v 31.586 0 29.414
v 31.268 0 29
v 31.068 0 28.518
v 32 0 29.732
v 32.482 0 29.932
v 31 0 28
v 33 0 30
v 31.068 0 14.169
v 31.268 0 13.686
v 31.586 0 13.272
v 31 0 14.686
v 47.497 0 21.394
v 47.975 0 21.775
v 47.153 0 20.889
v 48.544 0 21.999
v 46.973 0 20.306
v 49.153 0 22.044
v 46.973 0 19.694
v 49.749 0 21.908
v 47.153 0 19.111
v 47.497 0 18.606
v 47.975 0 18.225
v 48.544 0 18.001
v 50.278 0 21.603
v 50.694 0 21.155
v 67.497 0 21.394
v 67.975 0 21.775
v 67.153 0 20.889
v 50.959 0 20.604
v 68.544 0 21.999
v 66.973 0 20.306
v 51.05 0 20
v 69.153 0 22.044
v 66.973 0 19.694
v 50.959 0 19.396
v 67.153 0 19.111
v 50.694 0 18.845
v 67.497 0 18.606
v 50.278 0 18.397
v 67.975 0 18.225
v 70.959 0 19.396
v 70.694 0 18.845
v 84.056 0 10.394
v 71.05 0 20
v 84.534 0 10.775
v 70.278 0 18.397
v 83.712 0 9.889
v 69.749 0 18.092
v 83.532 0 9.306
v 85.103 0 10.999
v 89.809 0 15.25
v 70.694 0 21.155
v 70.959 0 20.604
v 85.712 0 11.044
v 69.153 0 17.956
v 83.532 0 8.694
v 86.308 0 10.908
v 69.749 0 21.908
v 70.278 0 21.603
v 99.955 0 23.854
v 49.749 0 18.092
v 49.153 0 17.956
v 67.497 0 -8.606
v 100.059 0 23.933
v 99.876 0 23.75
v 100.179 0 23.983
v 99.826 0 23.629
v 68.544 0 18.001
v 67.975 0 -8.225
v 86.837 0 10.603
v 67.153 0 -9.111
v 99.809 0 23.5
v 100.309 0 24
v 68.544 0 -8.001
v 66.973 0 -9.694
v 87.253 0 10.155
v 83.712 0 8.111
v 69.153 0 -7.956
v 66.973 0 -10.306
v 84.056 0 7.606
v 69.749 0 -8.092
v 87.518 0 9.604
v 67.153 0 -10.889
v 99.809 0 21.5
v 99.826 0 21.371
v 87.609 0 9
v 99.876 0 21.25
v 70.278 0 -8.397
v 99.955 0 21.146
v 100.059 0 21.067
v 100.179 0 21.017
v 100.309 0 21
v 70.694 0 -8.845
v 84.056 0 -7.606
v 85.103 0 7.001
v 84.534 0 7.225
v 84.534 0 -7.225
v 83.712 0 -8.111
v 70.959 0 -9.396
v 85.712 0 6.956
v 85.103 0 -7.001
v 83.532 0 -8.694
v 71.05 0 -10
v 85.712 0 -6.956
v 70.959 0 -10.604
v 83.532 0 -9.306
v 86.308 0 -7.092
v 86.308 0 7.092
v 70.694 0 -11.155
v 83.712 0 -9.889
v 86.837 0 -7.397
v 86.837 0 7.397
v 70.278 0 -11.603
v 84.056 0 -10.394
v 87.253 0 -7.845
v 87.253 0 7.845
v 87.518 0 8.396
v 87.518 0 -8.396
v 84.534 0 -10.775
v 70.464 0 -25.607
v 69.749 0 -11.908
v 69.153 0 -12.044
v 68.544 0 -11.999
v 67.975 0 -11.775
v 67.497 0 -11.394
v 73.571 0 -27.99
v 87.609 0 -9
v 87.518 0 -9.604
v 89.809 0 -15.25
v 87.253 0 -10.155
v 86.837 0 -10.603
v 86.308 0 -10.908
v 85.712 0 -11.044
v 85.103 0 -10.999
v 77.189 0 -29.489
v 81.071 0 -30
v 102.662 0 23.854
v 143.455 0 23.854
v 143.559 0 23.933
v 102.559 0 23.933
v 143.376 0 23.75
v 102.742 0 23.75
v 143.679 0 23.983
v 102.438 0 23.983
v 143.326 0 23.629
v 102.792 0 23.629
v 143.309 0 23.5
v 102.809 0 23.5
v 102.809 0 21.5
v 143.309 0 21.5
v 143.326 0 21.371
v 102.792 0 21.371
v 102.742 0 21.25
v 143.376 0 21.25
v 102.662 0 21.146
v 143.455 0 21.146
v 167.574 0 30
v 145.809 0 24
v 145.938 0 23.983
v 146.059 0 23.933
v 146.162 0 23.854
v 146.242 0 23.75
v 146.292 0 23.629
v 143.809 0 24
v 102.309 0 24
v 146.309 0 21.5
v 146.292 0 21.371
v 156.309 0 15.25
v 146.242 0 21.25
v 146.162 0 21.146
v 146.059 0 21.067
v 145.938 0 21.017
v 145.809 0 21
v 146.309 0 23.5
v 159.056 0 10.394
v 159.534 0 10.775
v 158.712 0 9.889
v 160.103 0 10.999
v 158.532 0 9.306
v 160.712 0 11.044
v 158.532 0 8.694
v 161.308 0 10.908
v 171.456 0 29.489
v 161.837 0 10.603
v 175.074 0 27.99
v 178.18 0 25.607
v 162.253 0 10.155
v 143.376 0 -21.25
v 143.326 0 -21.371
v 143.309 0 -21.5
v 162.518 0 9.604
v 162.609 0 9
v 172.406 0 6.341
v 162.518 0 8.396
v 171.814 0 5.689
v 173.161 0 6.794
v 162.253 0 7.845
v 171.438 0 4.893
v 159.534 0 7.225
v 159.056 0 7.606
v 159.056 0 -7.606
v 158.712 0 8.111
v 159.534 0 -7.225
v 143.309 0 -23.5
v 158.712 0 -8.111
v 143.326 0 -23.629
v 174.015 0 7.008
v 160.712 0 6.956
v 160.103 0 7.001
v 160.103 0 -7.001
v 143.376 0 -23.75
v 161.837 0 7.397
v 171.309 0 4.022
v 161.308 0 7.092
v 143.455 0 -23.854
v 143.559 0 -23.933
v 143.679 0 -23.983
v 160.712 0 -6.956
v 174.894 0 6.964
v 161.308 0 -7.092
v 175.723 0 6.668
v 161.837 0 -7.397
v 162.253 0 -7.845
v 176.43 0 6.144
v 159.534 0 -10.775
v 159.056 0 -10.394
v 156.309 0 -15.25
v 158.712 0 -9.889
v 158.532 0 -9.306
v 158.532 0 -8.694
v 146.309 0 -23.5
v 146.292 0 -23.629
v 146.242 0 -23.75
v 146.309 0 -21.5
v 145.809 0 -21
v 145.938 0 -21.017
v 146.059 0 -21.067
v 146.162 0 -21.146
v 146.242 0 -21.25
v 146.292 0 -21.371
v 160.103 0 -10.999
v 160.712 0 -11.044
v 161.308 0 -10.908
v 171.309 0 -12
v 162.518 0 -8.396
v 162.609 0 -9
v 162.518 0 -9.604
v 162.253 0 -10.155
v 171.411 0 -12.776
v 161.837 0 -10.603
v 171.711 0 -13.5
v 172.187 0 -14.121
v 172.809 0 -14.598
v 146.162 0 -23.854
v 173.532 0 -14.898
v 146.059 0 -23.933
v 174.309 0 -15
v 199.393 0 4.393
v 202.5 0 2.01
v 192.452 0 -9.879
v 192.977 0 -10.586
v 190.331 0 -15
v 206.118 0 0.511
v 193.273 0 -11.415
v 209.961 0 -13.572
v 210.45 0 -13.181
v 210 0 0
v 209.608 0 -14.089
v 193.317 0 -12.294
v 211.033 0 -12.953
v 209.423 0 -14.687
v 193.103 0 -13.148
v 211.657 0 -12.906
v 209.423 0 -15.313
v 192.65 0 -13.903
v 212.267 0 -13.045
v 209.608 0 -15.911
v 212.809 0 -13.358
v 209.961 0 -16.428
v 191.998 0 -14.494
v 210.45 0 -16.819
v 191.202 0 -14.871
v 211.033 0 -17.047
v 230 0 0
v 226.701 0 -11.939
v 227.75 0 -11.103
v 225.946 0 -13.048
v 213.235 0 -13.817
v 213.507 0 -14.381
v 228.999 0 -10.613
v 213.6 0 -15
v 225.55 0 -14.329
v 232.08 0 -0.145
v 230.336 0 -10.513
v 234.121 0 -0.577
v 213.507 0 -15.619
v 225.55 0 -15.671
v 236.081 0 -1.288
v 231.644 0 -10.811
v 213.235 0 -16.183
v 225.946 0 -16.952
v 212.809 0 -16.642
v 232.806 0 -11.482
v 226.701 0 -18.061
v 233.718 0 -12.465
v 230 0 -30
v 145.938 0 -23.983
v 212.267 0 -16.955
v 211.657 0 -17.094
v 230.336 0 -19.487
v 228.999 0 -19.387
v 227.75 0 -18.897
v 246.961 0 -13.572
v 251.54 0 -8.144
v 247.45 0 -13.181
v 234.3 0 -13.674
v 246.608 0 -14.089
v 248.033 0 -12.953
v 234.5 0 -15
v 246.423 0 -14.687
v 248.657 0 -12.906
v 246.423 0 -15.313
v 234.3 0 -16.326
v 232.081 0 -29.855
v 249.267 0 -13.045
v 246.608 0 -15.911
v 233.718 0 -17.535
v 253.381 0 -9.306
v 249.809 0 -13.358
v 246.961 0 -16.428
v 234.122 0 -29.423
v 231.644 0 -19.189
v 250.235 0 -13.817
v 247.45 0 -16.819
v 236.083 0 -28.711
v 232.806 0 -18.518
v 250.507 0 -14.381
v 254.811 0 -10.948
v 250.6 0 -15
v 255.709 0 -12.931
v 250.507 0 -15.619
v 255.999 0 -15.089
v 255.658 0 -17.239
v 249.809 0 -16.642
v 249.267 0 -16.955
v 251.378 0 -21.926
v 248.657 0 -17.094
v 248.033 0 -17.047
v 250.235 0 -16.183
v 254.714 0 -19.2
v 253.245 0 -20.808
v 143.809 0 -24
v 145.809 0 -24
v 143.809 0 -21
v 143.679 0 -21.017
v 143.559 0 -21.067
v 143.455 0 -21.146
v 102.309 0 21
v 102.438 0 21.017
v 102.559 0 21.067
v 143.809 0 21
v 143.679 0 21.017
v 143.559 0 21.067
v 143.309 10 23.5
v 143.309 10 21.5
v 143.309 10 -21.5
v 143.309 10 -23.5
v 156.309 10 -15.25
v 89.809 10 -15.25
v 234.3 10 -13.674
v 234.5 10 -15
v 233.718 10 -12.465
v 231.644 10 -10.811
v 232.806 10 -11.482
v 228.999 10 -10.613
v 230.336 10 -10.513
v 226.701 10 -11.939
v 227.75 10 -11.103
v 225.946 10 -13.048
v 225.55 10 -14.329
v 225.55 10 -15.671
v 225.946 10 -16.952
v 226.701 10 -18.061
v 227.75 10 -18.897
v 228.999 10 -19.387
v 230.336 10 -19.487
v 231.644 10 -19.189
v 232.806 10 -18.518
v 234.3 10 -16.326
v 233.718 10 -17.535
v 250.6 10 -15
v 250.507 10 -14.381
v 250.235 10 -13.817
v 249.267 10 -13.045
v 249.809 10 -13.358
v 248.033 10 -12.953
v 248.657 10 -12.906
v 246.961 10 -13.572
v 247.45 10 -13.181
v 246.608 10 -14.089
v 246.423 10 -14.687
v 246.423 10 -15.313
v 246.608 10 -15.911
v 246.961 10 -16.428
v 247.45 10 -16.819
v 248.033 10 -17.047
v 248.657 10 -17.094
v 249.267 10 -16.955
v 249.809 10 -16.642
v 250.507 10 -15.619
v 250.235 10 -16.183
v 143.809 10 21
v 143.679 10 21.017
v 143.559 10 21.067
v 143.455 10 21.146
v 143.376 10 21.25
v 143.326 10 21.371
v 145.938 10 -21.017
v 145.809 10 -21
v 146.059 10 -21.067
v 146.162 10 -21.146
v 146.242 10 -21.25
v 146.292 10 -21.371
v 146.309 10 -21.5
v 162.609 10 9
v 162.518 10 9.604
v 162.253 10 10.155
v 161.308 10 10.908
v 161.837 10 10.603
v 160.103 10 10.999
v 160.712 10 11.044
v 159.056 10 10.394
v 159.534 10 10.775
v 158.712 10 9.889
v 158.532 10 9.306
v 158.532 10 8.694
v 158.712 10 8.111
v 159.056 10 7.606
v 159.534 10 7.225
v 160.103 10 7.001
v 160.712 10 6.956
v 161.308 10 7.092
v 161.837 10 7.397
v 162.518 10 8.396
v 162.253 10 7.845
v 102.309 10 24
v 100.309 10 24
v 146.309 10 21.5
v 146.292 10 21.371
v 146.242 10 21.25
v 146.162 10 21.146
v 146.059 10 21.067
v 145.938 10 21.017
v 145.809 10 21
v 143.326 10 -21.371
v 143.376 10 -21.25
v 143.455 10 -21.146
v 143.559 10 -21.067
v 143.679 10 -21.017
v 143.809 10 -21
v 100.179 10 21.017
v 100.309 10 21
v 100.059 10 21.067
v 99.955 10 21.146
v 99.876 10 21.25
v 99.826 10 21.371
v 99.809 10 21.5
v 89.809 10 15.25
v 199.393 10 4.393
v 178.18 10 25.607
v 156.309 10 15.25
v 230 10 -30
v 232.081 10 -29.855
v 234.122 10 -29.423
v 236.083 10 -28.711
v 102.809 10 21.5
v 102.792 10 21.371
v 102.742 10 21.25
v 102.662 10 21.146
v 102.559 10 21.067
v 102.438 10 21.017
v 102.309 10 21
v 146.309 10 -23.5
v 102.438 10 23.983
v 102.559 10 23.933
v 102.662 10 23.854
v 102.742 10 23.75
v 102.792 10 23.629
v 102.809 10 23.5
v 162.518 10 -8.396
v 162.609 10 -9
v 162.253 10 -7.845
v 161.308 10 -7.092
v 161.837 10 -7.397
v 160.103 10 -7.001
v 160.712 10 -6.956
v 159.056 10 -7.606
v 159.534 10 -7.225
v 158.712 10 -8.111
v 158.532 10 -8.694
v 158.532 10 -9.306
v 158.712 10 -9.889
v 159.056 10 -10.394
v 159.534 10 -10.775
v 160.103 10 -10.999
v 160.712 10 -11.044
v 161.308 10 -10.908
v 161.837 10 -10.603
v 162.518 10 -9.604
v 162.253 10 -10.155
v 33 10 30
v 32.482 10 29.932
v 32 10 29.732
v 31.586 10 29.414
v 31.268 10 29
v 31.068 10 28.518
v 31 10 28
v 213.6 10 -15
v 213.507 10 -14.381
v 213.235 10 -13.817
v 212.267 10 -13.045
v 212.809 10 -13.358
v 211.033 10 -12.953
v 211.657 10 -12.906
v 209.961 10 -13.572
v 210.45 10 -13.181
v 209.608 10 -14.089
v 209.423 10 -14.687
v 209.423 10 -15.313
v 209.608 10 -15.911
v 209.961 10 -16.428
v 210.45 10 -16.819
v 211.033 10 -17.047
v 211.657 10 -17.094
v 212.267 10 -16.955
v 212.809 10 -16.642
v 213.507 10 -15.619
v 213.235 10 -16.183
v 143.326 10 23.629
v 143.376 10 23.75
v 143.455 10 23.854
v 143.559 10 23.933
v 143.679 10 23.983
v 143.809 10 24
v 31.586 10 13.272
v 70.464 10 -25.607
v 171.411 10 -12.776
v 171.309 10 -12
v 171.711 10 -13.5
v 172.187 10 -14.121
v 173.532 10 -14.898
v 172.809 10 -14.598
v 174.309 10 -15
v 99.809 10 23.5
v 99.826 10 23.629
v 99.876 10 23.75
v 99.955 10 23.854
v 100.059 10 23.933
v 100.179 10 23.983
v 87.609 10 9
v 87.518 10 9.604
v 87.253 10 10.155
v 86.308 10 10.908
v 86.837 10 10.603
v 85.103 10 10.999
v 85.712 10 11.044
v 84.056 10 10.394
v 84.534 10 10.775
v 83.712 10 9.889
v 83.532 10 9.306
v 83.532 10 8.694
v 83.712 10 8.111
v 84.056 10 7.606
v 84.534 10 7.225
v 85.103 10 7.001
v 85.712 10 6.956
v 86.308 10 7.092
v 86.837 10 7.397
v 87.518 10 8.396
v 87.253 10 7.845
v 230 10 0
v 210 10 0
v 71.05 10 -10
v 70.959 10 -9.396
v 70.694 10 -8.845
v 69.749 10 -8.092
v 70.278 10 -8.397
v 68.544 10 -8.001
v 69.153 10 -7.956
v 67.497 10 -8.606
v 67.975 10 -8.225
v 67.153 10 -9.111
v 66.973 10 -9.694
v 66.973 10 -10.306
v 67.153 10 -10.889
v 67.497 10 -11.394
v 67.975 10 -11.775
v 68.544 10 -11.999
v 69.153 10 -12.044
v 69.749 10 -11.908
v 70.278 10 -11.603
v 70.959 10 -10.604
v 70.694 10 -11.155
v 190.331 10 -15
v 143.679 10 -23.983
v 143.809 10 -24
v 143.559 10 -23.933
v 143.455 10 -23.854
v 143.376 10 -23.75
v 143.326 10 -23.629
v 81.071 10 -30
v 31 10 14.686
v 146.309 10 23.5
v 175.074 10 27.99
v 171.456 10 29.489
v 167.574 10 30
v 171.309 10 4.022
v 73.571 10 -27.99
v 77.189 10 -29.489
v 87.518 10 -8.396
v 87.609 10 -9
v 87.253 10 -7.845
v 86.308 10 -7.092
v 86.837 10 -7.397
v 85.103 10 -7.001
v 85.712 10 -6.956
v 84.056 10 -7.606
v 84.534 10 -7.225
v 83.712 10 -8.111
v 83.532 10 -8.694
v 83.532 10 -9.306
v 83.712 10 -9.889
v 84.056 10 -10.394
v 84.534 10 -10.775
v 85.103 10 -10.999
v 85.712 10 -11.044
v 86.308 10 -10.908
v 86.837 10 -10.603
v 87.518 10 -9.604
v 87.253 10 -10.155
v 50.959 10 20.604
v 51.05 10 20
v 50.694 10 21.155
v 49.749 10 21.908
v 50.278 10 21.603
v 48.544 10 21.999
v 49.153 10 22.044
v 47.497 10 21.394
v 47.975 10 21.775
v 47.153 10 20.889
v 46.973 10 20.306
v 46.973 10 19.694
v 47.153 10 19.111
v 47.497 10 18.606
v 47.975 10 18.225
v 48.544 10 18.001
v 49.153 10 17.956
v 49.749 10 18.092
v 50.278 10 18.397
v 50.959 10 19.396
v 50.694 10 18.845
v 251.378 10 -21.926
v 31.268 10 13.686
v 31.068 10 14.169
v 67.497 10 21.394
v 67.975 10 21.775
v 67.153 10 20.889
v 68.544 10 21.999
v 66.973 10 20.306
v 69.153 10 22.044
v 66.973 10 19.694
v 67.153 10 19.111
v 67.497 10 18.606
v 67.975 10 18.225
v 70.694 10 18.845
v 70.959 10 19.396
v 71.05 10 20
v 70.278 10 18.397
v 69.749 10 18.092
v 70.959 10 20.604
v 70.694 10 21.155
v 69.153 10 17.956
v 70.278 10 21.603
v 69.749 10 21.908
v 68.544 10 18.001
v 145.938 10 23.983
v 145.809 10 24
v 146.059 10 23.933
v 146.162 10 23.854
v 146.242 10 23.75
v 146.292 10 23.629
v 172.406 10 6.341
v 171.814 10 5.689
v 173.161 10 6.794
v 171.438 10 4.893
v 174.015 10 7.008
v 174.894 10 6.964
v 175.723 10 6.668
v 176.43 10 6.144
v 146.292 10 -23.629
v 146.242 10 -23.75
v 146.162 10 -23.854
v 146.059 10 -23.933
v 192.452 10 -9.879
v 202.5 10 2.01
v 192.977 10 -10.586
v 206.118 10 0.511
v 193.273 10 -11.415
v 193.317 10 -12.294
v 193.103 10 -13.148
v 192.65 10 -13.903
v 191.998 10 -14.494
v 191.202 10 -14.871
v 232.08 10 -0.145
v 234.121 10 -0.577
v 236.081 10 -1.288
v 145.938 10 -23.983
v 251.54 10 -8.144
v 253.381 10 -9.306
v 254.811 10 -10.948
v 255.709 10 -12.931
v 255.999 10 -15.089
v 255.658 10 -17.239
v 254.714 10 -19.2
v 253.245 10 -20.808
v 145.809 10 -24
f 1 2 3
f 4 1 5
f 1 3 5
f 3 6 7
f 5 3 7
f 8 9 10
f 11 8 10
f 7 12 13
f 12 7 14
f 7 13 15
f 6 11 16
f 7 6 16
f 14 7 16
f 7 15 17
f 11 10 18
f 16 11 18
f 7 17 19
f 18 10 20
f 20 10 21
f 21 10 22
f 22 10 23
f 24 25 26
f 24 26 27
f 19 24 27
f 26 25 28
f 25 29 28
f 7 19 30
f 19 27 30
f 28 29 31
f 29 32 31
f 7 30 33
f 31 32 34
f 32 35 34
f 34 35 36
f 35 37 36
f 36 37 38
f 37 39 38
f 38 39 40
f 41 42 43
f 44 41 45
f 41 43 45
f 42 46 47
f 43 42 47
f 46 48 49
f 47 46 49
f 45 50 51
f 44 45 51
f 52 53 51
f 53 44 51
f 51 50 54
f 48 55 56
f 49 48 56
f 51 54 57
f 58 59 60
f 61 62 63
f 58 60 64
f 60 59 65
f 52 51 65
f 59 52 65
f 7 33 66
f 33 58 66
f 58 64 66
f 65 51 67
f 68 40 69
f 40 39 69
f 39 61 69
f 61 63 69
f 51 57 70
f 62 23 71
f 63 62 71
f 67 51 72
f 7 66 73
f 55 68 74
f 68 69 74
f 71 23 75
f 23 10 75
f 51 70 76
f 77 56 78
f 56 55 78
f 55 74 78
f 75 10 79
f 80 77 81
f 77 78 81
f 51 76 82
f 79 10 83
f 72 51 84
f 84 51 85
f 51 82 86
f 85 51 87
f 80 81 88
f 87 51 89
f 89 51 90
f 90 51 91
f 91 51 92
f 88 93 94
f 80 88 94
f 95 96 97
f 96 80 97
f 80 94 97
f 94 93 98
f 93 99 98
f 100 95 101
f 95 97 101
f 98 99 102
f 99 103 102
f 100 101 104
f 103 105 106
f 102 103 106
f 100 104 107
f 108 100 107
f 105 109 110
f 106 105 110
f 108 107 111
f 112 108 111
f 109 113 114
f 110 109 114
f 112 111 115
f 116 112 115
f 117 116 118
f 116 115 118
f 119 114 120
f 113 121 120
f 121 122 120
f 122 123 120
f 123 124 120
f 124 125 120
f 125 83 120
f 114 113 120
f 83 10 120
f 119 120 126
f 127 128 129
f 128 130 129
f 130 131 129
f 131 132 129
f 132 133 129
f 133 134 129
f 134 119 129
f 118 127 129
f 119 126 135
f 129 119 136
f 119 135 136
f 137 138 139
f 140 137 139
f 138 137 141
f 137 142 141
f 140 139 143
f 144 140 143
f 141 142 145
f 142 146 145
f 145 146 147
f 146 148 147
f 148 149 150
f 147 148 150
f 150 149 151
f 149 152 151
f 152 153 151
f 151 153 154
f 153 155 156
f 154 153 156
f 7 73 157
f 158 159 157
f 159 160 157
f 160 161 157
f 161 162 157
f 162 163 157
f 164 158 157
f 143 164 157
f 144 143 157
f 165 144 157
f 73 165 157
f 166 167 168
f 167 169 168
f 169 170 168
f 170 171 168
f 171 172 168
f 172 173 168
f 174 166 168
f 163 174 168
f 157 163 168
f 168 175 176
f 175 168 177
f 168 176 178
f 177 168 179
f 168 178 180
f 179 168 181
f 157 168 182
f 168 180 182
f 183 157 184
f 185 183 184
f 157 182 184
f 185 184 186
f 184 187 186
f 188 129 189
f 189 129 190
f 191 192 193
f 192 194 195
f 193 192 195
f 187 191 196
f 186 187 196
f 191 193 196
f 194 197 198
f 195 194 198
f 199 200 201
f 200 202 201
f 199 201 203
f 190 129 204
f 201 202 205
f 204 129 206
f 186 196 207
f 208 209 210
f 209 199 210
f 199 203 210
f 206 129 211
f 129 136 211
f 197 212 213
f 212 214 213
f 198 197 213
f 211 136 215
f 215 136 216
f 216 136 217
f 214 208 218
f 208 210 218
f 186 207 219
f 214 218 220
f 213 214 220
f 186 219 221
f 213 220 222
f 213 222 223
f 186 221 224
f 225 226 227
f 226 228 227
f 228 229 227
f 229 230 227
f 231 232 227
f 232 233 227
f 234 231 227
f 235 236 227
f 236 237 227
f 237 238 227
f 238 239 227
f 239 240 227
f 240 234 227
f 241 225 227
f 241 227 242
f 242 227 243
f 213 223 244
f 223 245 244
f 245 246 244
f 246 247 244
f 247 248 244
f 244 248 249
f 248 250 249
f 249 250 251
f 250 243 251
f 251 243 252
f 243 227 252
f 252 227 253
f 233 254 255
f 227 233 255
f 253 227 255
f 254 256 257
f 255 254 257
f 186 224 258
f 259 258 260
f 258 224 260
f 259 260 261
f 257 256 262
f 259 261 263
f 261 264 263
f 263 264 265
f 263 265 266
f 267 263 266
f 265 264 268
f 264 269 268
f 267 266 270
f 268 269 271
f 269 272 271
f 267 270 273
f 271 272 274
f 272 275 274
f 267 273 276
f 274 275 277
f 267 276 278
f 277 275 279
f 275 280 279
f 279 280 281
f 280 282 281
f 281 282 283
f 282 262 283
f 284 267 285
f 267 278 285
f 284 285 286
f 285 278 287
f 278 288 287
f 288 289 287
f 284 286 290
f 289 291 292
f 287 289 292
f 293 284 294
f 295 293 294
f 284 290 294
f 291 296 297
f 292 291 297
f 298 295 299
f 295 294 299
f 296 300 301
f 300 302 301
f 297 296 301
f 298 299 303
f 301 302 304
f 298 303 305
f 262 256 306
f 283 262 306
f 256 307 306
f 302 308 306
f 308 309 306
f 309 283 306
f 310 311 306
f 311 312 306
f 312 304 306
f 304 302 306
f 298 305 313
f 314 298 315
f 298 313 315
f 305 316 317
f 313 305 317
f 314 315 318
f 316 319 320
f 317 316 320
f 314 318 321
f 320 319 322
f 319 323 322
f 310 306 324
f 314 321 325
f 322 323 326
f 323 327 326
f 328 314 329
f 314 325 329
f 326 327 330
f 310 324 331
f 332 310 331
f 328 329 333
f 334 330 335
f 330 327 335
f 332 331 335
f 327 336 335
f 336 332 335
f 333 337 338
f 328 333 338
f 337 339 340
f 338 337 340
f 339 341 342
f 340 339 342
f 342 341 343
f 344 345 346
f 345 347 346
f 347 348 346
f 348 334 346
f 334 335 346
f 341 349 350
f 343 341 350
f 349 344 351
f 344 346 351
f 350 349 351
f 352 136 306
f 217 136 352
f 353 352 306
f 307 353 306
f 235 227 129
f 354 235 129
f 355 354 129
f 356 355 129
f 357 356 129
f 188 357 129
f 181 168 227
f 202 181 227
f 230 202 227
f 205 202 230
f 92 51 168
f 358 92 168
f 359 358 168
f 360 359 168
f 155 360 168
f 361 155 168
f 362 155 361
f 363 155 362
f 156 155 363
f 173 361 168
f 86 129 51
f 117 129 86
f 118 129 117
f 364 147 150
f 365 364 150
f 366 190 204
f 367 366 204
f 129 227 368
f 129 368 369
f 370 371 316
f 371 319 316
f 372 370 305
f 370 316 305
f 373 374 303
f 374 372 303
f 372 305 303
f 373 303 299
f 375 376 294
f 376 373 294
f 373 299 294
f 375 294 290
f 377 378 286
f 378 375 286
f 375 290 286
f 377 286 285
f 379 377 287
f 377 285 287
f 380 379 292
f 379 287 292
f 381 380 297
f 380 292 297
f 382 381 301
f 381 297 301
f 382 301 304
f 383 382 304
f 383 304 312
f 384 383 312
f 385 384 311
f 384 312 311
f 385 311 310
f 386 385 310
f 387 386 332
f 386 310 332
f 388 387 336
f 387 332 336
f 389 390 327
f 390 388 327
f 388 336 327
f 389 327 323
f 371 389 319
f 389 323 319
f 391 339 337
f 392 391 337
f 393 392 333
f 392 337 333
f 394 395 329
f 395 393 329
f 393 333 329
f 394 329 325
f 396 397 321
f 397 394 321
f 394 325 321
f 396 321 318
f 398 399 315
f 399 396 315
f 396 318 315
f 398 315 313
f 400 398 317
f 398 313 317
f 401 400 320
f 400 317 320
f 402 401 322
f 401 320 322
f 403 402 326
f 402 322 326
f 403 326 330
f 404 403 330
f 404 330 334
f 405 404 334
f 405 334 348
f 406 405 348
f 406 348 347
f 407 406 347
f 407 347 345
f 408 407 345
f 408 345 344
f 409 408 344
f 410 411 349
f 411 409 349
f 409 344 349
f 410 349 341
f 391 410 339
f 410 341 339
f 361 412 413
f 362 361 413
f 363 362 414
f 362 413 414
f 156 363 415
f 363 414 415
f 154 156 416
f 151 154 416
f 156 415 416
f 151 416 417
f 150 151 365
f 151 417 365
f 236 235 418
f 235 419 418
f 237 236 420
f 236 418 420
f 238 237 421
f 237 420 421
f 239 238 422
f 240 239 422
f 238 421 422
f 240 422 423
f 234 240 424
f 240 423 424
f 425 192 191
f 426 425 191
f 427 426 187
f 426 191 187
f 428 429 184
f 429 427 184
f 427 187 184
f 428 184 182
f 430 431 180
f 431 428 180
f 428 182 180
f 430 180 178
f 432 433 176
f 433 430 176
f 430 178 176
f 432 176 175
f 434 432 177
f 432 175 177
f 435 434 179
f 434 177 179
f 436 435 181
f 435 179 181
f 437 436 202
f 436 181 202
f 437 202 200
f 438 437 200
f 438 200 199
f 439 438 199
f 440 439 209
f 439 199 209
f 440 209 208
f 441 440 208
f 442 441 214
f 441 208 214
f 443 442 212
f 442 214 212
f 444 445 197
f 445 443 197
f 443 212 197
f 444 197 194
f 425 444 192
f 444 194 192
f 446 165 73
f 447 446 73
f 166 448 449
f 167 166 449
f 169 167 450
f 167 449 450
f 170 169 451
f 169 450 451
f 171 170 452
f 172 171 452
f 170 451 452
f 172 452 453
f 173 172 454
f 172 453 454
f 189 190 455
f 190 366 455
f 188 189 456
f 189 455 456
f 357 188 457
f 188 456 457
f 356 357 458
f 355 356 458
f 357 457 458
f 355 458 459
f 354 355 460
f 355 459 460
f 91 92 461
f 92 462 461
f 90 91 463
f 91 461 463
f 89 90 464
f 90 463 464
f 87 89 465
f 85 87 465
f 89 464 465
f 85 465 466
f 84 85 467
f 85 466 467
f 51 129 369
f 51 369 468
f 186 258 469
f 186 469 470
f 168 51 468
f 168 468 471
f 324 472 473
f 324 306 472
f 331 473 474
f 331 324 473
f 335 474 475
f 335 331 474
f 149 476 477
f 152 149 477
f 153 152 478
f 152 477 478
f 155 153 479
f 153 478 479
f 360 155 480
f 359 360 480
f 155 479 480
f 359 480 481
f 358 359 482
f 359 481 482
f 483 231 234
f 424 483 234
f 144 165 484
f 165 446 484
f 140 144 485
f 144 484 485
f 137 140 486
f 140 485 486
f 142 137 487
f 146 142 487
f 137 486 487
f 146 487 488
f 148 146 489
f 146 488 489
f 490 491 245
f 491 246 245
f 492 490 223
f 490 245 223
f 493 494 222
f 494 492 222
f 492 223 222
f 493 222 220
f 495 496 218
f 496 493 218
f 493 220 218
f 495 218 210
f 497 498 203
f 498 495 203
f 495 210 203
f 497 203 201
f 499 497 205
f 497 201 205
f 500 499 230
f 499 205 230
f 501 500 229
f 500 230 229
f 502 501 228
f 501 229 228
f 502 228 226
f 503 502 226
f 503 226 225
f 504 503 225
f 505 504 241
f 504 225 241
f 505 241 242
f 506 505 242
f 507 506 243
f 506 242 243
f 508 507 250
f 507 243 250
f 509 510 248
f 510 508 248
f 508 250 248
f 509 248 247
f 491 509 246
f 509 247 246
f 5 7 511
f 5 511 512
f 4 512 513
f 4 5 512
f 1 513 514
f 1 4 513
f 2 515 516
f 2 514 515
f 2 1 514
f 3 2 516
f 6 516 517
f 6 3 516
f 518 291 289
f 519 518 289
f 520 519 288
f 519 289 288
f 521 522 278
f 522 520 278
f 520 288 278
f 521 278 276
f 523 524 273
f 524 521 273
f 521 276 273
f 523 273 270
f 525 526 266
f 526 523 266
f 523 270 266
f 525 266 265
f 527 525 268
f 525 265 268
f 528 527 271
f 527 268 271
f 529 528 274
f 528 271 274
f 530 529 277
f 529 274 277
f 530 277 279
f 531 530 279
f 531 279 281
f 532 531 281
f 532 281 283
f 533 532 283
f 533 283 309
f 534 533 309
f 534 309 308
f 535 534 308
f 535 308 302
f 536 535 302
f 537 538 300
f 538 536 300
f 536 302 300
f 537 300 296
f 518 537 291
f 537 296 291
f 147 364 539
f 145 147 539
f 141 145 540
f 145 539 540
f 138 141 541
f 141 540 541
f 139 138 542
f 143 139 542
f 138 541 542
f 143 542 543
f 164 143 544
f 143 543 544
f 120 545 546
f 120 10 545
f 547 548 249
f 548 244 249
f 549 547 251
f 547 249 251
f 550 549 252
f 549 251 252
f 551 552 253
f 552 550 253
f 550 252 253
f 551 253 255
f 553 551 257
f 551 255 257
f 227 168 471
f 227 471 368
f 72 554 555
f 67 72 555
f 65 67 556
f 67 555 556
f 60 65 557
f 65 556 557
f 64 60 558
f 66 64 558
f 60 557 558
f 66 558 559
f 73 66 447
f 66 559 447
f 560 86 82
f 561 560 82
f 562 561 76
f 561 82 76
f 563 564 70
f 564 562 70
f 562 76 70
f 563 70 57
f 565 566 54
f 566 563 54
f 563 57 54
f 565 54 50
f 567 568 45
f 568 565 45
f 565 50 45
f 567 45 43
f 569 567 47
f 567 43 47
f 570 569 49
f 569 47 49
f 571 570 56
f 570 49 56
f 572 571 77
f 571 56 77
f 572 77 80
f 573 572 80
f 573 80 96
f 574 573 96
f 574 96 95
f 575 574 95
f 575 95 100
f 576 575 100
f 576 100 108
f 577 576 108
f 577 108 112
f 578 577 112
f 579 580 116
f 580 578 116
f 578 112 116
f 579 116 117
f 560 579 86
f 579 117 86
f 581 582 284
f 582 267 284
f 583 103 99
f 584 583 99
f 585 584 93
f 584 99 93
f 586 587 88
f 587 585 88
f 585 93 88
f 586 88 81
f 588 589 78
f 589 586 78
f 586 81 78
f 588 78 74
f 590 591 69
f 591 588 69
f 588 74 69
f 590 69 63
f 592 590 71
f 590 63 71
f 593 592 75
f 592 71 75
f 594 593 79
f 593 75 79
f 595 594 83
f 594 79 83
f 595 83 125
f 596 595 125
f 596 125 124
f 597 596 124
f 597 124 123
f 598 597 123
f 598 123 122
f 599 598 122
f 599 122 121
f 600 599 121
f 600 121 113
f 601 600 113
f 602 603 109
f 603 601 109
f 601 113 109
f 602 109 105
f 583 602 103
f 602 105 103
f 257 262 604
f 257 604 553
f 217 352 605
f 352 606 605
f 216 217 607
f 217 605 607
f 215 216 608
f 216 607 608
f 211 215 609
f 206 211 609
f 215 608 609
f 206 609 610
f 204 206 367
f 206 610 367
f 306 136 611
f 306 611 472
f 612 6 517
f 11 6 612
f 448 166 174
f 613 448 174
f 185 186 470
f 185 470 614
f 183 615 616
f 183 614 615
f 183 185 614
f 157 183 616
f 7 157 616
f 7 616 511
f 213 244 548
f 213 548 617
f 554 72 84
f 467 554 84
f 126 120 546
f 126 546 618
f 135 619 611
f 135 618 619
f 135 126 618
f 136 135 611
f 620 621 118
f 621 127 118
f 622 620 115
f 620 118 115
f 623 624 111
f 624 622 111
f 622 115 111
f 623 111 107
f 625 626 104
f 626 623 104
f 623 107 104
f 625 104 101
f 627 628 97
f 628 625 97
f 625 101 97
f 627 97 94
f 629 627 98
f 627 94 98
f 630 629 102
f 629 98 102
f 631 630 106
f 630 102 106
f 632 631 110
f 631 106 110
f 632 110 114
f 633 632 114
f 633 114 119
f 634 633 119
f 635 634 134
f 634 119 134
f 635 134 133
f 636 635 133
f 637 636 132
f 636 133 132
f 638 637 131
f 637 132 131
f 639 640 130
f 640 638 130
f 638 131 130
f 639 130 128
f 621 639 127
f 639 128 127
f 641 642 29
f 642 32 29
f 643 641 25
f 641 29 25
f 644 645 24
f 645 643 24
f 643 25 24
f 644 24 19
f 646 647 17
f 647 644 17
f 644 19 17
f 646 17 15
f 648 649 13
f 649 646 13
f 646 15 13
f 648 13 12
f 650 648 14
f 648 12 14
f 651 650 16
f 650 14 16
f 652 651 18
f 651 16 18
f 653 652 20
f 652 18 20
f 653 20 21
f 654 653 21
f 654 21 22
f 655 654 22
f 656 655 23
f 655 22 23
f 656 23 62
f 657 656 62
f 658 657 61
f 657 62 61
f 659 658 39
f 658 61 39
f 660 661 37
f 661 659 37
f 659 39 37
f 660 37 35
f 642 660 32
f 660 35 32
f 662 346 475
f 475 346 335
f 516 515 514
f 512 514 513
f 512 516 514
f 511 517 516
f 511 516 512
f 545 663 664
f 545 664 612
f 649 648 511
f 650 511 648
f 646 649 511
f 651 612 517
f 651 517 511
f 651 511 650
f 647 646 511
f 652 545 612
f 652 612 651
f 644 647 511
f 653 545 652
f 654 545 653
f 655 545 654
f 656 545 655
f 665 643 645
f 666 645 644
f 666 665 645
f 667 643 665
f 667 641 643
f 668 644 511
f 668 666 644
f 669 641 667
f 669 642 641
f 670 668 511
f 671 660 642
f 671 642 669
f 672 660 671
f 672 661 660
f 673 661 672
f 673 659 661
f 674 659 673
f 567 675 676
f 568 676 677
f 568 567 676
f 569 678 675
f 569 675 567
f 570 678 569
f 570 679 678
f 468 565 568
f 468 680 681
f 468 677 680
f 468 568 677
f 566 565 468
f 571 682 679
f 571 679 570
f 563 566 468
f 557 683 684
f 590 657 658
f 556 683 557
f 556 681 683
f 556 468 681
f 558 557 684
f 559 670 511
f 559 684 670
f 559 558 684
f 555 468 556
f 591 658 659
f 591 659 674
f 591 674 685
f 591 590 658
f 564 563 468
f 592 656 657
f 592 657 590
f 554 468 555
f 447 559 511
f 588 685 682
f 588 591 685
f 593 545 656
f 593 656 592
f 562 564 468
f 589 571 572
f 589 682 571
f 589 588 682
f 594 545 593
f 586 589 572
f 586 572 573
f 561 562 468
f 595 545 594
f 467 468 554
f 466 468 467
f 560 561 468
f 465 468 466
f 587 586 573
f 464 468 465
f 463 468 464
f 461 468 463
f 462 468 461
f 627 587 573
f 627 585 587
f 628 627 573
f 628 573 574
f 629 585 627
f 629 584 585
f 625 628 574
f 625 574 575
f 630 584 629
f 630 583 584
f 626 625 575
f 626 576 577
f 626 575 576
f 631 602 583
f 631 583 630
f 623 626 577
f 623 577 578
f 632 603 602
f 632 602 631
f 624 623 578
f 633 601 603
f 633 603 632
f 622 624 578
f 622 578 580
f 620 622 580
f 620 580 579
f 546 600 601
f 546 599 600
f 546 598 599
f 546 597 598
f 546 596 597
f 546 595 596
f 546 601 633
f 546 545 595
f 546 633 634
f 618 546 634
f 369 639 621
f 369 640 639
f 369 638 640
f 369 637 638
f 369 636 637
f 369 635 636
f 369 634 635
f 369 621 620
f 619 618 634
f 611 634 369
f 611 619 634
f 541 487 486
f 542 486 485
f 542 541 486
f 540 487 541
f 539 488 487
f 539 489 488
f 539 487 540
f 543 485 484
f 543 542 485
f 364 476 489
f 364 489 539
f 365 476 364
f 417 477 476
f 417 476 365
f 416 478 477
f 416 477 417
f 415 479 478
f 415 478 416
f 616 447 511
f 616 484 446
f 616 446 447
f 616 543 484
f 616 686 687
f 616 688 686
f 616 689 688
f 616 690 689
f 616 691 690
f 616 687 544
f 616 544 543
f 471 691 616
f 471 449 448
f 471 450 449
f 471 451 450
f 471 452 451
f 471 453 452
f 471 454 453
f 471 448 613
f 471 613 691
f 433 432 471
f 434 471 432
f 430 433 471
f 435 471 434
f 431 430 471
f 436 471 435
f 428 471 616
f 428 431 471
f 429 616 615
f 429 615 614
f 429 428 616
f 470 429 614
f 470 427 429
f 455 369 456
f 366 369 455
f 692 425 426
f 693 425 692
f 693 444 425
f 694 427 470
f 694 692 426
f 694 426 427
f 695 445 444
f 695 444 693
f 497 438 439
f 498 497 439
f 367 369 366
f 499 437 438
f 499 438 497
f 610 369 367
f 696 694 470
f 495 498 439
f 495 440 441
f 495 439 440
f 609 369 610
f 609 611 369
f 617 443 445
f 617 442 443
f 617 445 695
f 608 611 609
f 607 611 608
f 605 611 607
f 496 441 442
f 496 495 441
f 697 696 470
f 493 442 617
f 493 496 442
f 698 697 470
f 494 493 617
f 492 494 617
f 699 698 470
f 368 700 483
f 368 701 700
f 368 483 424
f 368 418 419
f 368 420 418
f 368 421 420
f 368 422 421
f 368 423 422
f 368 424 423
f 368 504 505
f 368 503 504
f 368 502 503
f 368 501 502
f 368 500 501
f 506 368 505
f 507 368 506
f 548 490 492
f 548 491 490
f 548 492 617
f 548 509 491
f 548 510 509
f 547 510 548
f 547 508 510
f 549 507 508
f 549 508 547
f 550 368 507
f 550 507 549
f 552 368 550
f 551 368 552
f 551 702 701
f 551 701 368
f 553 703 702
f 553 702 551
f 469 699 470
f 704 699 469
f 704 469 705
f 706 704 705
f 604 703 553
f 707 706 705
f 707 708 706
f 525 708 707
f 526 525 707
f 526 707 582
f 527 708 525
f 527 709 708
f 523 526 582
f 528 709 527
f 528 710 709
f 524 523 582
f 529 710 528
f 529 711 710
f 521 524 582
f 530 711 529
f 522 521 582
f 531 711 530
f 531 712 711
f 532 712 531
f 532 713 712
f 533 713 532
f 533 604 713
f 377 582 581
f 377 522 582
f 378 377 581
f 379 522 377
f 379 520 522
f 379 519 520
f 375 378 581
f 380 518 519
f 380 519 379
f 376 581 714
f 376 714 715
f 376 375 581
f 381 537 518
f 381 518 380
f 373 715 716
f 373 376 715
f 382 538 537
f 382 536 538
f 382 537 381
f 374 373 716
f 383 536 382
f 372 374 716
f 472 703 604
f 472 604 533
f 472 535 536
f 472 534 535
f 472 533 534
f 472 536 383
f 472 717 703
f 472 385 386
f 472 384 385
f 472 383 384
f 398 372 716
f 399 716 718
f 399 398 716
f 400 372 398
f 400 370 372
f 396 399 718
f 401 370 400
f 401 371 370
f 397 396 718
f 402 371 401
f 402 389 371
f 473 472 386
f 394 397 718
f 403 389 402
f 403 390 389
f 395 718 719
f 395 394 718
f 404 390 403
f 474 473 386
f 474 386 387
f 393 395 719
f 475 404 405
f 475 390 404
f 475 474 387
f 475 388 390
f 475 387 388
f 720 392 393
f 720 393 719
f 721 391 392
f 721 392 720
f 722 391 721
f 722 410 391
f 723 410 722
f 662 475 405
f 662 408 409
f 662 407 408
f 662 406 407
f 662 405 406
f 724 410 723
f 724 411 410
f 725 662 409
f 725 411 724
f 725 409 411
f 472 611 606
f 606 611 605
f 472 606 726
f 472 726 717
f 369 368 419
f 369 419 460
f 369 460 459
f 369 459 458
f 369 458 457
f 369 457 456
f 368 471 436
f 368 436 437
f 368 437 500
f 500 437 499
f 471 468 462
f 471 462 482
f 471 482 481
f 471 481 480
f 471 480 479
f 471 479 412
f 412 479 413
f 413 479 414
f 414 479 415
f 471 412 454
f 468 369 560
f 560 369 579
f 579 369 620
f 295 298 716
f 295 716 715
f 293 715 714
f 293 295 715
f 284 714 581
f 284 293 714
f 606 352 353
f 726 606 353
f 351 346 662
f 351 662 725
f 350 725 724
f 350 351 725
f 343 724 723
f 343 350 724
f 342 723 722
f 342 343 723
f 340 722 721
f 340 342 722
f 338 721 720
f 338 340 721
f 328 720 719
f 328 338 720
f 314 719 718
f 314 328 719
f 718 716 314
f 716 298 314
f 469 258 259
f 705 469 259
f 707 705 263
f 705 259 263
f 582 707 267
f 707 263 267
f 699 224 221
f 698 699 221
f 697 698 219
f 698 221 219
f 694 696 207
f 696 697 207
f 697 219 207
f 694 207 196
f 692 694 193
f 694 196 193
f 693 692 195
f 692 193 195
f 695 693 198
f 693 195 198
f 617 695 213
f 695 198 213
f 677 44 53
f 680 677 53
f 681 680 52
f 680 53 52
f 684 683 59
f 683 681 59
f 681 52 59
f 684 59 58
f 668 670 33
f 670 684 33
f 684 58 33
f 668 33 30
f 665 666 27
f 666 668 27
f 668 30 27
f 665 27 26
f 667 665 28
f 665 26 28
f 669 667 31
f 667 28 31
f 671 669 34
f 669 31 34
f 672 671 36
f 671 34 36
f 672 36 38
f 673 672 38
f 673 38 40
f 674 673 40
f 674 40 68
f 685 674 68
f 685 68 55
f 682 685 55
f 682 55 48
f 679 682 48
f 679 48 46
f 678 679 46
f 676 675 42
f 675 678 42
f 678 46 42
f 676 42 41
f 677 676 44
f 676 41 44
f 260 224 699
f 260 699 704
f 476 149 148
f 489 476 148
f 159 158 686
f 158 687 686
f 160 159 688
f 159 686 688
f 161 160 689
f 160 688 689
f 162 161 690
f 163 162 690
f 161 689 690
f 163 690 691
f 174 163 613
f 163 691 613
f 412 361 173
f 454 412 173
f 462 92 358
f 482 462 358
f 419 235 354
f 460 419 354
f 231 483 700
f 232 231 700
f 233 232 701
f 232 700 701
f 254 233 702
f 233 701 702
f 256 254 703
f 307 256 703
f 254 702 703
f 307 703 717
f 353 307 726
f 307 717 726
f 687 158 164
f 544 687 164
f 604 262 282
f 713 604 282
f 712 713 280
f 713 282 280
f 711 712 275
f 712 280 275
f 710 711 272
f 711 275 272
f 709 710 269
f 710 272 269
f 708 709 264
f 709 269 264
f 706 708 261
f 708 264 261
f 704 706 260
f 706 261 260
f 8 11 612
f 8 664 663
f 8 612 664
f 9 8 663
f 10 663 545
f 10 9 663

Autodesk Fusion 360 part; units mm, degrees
sketch "Skizze3" plane through (0, 0, 0) normal (0, 1, 0) x (1, 0, 0)
  line L0 (167.5736, -30) -> (33, -30)
  line L1 (31, -28) -> (31, -14.6863)
  line L2 (31.5858, -13.2721) -> (70.4645, 25.6066)
  line L3 (81.0711, 30) -> (230, 30)
  line L4 (199.3934, -4.3934) -> (178.1802, -25.6066)
  line L5 (210, 0) -> (230, 0)
  circle A0 centre (230, 15) radius 4.5
  circle A1 centre (211.5, 15) radius 2.1
  circle A2 centre (248.5, 15) radius 2.1
  circle A3 centre (248.5, 15) radius 7.5
  circle A4 centre (230, 15) radius 15
  line L6 (236.0811, 1.2879) -> (251.5405, 8.144)
  line L7 (251.3776, 21.926) -> (236.0828, 28.7113)
  arc A5 (167.5736, -30) -> (178.1802, -25.6066) centre (167.5736, -15) ccw
  arc A6 (210, 0) -> (199.3934, -4.3934) centre (210, -15) ccw
  arc A7 (81.0711, 30) -> (70.4645, 25.6066) centre (81.0711, 15) ccw
  arc A8 (31.5858, -13.2721) -> (31, -14.6863) centre (33, -14.6863) ccw
  arc A9 (31, -28) -> (33, -30) centre (33, -28) ccw
  line L8 (89.8088, -15.25) -> (156.3088, -15.25)
  line L9 (89.8088, 15.25) -> (89.8088, -15.25)
  line L10 (156.3088, -15.25) -> (156.3088, 15.25)
  line L11 (156.3088, 15.25) -> (89.8088, 15.25)
  circle A10 centre (160.5588, 9) radius 2.05
  circle A11 centre (85.5588, 9) radius 2.05
  circle A12 centre (85.5588, -9) radius 2.05
  circle A13 centre (160.5588, -9) radius 2.05
  line L12 (171.3088, 12) -> (171.3088, -4.0221)
  line L13 (176.4301, -6.1435) -> (192.4523, 9.8787)
  line L14 (190.331, 15) -> (174.3088, 15)
  arc A14 (174.3088, 15) -> (171.3088, 12) centre (174.3088, 12) ccw
  arc A15 (171.3088, -4.0221) -> (176.4301, -6.1435) centre (174.3088, -4.0221) ccw
  arc A16 (192.4523, 9.8787) -> (190.331, 15) centre (190.331, 12) ccw
  circle A17 centre (49, -20) radius 2.05
  circle A18 centre (69, 10) radius 2.05
  circle A19 centre (69, -20) radius 2.05
  dimension "d66" = 9
  dimension "d68" = 4.2
  dimension "d69" = 18.5
  dimension "d70" = 4.2
  dimension "d71" = 18.5
  dimension "d72" = 15
  dimension "d73" = 15
  dimension "d74" = 30
  dimension "d103" = 15
  dimension "d104" = 15
  dimension "d105" = 15
  dimension "d106" = 2
  dimension "d115" = 230
  dimension "d119" = 31
  dimension "d120" = 135
  dimension "d121" = 2
  dimension "d134" = 15.25
  dimension "d135" = 15.25
  dimension "d136" = 33.25
  dimension "d137" = 33.25
  dimension "d138" = 4.1
  dimension "d139" = 18
  dimension "d140" = 75
  dimension "d143" = 18.2
  dimension "d144" = 15.25
  dimension "d145" = 9
  dimension "d146" = 37.5
  dimension "d147" = 90
  dimension "d148" = 3
  dimension "d149" = 3
  dimension "d150" = 3
  dimension "d169" = 4.1
  dimension "d170" = 10
  dimension "d171" = 30
  dimension "d172" = 10
  dimension "d173" = 18
  dimension "d174" = 20
  dimension "d175" = 60
  dimension "d176" = 135
  dimension "d177" = 15
  dimension "d178" = 15
  dimension "d179" = 20
  dimension "d180" = 15
extrude "Extrusion16" add sketch "Skizze3" along normal blind 10
sketch "Skizze7" plane through (0, 10, 0) normal (0, 1, 0) x (-1, 0, 0)
  circle A0 centre (-248.5, -15) radius 2.1
  circle A1 centre (-85.5588, -9) radius 2.05
  line L0 (-89.8088, -15.25) -> (-156.3088, -15.25)
  line L1 (-156.3088, -15.25) -> (-156.3088, 15.25)
  line L2 (-156.3088, 15.25) -> (-89.8088, 15.25)
  line L3 (-89.8088, 15.25) -> (-89.8088, -15.25)
  circle A2 centre (-160.5588, 9) radius 2.05
  circle A3 centre (-85.5588, 9) radius 2.05
  circle A4 centre (-211.5, -15) radius 2.1
  circle A5 centre (-160.5588, -9) radius 2.05
  circle A6 centre (-230, -15) radius 4.5
  arc A7 (-192.4523, -9.8787) -> (-190.331, -15) centre (-190.331, -12) ccw
  line L4 (-192.4523, -9.8787) -> (-176.4301, 6.1435)
  arc A8 (-171.3088, 4.0221) -> (-176.4301, 6.1435) centre (-174.3088, 4.0221) ccw
  line L5 (-171.3088, 4.0221) -> (-171.3088, -12)
  arc A9 (-174.3088, -15) -> (-171.3088, -12) centre (-174.3088, -12) ccw
  line L6 (-174.3088, -15) -> (-190.331, -15)
  arc A10 (-31.5858, 13.2721) -> (-31, 14.6863) centre (-33, 14.6863) ccw
  line L7 (-31, 14.6863) -> (-31, 28)
  arc A11 (-31, 28) -> (-33, 30) centre (-33, 28) ccw
  line L8 (-33, 30) -> (-167.5736, 30)
  arc A12 (-167.5736, 30) -> (-178.1802, 25.6066) centre (-167.5736, 15) ccw
  line L9 (-178.1802, 25.6066) -> (-199.3934, 4.3934)
  arc A13 (-210, 0) -> (-199.3934, 4.3934) centre (-210, 15) ccw
  line L10 (-210, 0) -> (-230, 0)
  arc A14 (-230, 0) -> (-236.0811, -1.2879) centre (-230, -15) ccw
  line L11 (-236.0811, -1.2879) -> (-251.5405, -8.144)
  arc A15 (-251.5405, -8.144) -> (-251.3776, -21.926) centre (-248.5, -15) ccw
  line L12 (-251.3776, -21.926) -> (-236.0828, -28.7113)
  arc A16 (-236.0828, -28.7113) -> (-230, -30) centre (-230, -15) ccw
  line L13 (-230, -30) -> (-81.0711, -30)
  arc A17 (-81.0711, -30) -> (-70.4645, -25.6066) centre (-81.0711, -15) ccw
  line L14 (-70.4645, -25.6066) -> (-31.5858, 13.2721)
  line L15 (-143.8088, 21) -> (-145.8088, 21)
  line L16 (-146.3088, 21.5) -> (-146.3088, 23.5)
  line L17 (-145.8088, 24) -> (-143.8088, 24)
  line L18 (-143.3088, 23.5) -> (-143.3088, 21.5)
  arc A18 (-146.3088, 21.5) -> (-145.8088, 21) centre (-145.8088, 21.5) ccw
  arc A19 (-143.8088, 21) -> (-143.3088, 21.5) centre (-143.8088, 21.5) ccw
  arc A20 (-143.3088, 23.5) -> (-143.8088, 24) centre (-143.8088, 23.5) ccw
  arc A21 (-145.8088, 24) -> (-146.3088, 23.5) centre (-145.8088, 23.5) ccw
  line L19 (-102.3088, 24) -> (-100.3088, 24)
  arc A22 (-99.8088, 23.5) -> (-100.3088, 24) centre (-100.3088, 23.5) ccw
  arc A23 (-100.3088, 21) -> (-99.8088, 21.5) centre (-100.3088, 21.5) ccw
  line L20 (-100.3088, 21) -> (-102.3088, 21)
  arc A24 (-102.3088, 24) -> (-102.8088, 23.5) centre (-102.3088, 23.5) ccw
  line L21 (-99.8088, 23.5) -> (-99.8088, 21.5)
  arc A25 (-102.8088, 21.5) -> (-102.3088, 21) centre (-102.3088, 21.5) ccw
  line L22 (-102.8088, 21.5) -> (-102.8088, 23.5)
  line L23 (-145.8088, -21) -> (-143.8088, -21)
  arc A26 (-143.3088, -21.5) -> (-143.8088, -21) centre (-143.8088, -21.5) ccw
  arc A27 (-143.8088, -24) -> (-143.3088, -23.5) centre (-143.8088, -23.5) ccw
  line L24 (-143.8088, -24) -> (-145.8088, -24)
  arc A28 (-145.8088, -21) -> (-146.3088, -21.5) centre (-145.8088, -21.5) ccw
  line L25 (-143.3088, -21.5) -> (-143.3088, -23.5)
  arc A29 (-146.3088, -23.5) -> (-145.8088, -24) centre (-145.8088, -23.5) ccw
  line L26 (-146.3088, -23.5) -> (-146.3088, -21.5)
  circle A30 centre (-49, 20) radius 2.05
  circle A31 centre (-69, -10) radius 2.05
  circle A32 centre (-69, 20) radius 2.05
  dimension "d151" = 3
  dimension "d152" = 3
  dimension "d153" = 6
  dimension "d154" = 0.5
  dimension "d155" = 3
  dimension "d156" = 3
  dimension "d157" = 0.5
  dimension "d158" = 6
  dimension "d159" = 10
  dimension "d160" = 10
  dimension "d163" = 3
  dimension "d164" = 3
  dimension "d165" = 0.5
  dimension "d166" = 6
  dimension "d167" = 10
extrude "Extrusion18" cut sketch "Skizze7" against normal blind 10 contours L15 L16 L17 L18 A18 A19 A20 A21 | L19 A22 A23 L20 A24 L21 A25 L22 | L23 A26 A27 L24 A28 L25 A29 L26
equation "d134 = 15 mm + tolerance"
equation "d135 = 15 mm + tolerance"
equation "d136 = 33 mm + tolerance"
equation "d137 = 33 mm + tolerance"
equation "d144 = 15 mm + tolerance"
equation "tolerance = 0.25 mm"
